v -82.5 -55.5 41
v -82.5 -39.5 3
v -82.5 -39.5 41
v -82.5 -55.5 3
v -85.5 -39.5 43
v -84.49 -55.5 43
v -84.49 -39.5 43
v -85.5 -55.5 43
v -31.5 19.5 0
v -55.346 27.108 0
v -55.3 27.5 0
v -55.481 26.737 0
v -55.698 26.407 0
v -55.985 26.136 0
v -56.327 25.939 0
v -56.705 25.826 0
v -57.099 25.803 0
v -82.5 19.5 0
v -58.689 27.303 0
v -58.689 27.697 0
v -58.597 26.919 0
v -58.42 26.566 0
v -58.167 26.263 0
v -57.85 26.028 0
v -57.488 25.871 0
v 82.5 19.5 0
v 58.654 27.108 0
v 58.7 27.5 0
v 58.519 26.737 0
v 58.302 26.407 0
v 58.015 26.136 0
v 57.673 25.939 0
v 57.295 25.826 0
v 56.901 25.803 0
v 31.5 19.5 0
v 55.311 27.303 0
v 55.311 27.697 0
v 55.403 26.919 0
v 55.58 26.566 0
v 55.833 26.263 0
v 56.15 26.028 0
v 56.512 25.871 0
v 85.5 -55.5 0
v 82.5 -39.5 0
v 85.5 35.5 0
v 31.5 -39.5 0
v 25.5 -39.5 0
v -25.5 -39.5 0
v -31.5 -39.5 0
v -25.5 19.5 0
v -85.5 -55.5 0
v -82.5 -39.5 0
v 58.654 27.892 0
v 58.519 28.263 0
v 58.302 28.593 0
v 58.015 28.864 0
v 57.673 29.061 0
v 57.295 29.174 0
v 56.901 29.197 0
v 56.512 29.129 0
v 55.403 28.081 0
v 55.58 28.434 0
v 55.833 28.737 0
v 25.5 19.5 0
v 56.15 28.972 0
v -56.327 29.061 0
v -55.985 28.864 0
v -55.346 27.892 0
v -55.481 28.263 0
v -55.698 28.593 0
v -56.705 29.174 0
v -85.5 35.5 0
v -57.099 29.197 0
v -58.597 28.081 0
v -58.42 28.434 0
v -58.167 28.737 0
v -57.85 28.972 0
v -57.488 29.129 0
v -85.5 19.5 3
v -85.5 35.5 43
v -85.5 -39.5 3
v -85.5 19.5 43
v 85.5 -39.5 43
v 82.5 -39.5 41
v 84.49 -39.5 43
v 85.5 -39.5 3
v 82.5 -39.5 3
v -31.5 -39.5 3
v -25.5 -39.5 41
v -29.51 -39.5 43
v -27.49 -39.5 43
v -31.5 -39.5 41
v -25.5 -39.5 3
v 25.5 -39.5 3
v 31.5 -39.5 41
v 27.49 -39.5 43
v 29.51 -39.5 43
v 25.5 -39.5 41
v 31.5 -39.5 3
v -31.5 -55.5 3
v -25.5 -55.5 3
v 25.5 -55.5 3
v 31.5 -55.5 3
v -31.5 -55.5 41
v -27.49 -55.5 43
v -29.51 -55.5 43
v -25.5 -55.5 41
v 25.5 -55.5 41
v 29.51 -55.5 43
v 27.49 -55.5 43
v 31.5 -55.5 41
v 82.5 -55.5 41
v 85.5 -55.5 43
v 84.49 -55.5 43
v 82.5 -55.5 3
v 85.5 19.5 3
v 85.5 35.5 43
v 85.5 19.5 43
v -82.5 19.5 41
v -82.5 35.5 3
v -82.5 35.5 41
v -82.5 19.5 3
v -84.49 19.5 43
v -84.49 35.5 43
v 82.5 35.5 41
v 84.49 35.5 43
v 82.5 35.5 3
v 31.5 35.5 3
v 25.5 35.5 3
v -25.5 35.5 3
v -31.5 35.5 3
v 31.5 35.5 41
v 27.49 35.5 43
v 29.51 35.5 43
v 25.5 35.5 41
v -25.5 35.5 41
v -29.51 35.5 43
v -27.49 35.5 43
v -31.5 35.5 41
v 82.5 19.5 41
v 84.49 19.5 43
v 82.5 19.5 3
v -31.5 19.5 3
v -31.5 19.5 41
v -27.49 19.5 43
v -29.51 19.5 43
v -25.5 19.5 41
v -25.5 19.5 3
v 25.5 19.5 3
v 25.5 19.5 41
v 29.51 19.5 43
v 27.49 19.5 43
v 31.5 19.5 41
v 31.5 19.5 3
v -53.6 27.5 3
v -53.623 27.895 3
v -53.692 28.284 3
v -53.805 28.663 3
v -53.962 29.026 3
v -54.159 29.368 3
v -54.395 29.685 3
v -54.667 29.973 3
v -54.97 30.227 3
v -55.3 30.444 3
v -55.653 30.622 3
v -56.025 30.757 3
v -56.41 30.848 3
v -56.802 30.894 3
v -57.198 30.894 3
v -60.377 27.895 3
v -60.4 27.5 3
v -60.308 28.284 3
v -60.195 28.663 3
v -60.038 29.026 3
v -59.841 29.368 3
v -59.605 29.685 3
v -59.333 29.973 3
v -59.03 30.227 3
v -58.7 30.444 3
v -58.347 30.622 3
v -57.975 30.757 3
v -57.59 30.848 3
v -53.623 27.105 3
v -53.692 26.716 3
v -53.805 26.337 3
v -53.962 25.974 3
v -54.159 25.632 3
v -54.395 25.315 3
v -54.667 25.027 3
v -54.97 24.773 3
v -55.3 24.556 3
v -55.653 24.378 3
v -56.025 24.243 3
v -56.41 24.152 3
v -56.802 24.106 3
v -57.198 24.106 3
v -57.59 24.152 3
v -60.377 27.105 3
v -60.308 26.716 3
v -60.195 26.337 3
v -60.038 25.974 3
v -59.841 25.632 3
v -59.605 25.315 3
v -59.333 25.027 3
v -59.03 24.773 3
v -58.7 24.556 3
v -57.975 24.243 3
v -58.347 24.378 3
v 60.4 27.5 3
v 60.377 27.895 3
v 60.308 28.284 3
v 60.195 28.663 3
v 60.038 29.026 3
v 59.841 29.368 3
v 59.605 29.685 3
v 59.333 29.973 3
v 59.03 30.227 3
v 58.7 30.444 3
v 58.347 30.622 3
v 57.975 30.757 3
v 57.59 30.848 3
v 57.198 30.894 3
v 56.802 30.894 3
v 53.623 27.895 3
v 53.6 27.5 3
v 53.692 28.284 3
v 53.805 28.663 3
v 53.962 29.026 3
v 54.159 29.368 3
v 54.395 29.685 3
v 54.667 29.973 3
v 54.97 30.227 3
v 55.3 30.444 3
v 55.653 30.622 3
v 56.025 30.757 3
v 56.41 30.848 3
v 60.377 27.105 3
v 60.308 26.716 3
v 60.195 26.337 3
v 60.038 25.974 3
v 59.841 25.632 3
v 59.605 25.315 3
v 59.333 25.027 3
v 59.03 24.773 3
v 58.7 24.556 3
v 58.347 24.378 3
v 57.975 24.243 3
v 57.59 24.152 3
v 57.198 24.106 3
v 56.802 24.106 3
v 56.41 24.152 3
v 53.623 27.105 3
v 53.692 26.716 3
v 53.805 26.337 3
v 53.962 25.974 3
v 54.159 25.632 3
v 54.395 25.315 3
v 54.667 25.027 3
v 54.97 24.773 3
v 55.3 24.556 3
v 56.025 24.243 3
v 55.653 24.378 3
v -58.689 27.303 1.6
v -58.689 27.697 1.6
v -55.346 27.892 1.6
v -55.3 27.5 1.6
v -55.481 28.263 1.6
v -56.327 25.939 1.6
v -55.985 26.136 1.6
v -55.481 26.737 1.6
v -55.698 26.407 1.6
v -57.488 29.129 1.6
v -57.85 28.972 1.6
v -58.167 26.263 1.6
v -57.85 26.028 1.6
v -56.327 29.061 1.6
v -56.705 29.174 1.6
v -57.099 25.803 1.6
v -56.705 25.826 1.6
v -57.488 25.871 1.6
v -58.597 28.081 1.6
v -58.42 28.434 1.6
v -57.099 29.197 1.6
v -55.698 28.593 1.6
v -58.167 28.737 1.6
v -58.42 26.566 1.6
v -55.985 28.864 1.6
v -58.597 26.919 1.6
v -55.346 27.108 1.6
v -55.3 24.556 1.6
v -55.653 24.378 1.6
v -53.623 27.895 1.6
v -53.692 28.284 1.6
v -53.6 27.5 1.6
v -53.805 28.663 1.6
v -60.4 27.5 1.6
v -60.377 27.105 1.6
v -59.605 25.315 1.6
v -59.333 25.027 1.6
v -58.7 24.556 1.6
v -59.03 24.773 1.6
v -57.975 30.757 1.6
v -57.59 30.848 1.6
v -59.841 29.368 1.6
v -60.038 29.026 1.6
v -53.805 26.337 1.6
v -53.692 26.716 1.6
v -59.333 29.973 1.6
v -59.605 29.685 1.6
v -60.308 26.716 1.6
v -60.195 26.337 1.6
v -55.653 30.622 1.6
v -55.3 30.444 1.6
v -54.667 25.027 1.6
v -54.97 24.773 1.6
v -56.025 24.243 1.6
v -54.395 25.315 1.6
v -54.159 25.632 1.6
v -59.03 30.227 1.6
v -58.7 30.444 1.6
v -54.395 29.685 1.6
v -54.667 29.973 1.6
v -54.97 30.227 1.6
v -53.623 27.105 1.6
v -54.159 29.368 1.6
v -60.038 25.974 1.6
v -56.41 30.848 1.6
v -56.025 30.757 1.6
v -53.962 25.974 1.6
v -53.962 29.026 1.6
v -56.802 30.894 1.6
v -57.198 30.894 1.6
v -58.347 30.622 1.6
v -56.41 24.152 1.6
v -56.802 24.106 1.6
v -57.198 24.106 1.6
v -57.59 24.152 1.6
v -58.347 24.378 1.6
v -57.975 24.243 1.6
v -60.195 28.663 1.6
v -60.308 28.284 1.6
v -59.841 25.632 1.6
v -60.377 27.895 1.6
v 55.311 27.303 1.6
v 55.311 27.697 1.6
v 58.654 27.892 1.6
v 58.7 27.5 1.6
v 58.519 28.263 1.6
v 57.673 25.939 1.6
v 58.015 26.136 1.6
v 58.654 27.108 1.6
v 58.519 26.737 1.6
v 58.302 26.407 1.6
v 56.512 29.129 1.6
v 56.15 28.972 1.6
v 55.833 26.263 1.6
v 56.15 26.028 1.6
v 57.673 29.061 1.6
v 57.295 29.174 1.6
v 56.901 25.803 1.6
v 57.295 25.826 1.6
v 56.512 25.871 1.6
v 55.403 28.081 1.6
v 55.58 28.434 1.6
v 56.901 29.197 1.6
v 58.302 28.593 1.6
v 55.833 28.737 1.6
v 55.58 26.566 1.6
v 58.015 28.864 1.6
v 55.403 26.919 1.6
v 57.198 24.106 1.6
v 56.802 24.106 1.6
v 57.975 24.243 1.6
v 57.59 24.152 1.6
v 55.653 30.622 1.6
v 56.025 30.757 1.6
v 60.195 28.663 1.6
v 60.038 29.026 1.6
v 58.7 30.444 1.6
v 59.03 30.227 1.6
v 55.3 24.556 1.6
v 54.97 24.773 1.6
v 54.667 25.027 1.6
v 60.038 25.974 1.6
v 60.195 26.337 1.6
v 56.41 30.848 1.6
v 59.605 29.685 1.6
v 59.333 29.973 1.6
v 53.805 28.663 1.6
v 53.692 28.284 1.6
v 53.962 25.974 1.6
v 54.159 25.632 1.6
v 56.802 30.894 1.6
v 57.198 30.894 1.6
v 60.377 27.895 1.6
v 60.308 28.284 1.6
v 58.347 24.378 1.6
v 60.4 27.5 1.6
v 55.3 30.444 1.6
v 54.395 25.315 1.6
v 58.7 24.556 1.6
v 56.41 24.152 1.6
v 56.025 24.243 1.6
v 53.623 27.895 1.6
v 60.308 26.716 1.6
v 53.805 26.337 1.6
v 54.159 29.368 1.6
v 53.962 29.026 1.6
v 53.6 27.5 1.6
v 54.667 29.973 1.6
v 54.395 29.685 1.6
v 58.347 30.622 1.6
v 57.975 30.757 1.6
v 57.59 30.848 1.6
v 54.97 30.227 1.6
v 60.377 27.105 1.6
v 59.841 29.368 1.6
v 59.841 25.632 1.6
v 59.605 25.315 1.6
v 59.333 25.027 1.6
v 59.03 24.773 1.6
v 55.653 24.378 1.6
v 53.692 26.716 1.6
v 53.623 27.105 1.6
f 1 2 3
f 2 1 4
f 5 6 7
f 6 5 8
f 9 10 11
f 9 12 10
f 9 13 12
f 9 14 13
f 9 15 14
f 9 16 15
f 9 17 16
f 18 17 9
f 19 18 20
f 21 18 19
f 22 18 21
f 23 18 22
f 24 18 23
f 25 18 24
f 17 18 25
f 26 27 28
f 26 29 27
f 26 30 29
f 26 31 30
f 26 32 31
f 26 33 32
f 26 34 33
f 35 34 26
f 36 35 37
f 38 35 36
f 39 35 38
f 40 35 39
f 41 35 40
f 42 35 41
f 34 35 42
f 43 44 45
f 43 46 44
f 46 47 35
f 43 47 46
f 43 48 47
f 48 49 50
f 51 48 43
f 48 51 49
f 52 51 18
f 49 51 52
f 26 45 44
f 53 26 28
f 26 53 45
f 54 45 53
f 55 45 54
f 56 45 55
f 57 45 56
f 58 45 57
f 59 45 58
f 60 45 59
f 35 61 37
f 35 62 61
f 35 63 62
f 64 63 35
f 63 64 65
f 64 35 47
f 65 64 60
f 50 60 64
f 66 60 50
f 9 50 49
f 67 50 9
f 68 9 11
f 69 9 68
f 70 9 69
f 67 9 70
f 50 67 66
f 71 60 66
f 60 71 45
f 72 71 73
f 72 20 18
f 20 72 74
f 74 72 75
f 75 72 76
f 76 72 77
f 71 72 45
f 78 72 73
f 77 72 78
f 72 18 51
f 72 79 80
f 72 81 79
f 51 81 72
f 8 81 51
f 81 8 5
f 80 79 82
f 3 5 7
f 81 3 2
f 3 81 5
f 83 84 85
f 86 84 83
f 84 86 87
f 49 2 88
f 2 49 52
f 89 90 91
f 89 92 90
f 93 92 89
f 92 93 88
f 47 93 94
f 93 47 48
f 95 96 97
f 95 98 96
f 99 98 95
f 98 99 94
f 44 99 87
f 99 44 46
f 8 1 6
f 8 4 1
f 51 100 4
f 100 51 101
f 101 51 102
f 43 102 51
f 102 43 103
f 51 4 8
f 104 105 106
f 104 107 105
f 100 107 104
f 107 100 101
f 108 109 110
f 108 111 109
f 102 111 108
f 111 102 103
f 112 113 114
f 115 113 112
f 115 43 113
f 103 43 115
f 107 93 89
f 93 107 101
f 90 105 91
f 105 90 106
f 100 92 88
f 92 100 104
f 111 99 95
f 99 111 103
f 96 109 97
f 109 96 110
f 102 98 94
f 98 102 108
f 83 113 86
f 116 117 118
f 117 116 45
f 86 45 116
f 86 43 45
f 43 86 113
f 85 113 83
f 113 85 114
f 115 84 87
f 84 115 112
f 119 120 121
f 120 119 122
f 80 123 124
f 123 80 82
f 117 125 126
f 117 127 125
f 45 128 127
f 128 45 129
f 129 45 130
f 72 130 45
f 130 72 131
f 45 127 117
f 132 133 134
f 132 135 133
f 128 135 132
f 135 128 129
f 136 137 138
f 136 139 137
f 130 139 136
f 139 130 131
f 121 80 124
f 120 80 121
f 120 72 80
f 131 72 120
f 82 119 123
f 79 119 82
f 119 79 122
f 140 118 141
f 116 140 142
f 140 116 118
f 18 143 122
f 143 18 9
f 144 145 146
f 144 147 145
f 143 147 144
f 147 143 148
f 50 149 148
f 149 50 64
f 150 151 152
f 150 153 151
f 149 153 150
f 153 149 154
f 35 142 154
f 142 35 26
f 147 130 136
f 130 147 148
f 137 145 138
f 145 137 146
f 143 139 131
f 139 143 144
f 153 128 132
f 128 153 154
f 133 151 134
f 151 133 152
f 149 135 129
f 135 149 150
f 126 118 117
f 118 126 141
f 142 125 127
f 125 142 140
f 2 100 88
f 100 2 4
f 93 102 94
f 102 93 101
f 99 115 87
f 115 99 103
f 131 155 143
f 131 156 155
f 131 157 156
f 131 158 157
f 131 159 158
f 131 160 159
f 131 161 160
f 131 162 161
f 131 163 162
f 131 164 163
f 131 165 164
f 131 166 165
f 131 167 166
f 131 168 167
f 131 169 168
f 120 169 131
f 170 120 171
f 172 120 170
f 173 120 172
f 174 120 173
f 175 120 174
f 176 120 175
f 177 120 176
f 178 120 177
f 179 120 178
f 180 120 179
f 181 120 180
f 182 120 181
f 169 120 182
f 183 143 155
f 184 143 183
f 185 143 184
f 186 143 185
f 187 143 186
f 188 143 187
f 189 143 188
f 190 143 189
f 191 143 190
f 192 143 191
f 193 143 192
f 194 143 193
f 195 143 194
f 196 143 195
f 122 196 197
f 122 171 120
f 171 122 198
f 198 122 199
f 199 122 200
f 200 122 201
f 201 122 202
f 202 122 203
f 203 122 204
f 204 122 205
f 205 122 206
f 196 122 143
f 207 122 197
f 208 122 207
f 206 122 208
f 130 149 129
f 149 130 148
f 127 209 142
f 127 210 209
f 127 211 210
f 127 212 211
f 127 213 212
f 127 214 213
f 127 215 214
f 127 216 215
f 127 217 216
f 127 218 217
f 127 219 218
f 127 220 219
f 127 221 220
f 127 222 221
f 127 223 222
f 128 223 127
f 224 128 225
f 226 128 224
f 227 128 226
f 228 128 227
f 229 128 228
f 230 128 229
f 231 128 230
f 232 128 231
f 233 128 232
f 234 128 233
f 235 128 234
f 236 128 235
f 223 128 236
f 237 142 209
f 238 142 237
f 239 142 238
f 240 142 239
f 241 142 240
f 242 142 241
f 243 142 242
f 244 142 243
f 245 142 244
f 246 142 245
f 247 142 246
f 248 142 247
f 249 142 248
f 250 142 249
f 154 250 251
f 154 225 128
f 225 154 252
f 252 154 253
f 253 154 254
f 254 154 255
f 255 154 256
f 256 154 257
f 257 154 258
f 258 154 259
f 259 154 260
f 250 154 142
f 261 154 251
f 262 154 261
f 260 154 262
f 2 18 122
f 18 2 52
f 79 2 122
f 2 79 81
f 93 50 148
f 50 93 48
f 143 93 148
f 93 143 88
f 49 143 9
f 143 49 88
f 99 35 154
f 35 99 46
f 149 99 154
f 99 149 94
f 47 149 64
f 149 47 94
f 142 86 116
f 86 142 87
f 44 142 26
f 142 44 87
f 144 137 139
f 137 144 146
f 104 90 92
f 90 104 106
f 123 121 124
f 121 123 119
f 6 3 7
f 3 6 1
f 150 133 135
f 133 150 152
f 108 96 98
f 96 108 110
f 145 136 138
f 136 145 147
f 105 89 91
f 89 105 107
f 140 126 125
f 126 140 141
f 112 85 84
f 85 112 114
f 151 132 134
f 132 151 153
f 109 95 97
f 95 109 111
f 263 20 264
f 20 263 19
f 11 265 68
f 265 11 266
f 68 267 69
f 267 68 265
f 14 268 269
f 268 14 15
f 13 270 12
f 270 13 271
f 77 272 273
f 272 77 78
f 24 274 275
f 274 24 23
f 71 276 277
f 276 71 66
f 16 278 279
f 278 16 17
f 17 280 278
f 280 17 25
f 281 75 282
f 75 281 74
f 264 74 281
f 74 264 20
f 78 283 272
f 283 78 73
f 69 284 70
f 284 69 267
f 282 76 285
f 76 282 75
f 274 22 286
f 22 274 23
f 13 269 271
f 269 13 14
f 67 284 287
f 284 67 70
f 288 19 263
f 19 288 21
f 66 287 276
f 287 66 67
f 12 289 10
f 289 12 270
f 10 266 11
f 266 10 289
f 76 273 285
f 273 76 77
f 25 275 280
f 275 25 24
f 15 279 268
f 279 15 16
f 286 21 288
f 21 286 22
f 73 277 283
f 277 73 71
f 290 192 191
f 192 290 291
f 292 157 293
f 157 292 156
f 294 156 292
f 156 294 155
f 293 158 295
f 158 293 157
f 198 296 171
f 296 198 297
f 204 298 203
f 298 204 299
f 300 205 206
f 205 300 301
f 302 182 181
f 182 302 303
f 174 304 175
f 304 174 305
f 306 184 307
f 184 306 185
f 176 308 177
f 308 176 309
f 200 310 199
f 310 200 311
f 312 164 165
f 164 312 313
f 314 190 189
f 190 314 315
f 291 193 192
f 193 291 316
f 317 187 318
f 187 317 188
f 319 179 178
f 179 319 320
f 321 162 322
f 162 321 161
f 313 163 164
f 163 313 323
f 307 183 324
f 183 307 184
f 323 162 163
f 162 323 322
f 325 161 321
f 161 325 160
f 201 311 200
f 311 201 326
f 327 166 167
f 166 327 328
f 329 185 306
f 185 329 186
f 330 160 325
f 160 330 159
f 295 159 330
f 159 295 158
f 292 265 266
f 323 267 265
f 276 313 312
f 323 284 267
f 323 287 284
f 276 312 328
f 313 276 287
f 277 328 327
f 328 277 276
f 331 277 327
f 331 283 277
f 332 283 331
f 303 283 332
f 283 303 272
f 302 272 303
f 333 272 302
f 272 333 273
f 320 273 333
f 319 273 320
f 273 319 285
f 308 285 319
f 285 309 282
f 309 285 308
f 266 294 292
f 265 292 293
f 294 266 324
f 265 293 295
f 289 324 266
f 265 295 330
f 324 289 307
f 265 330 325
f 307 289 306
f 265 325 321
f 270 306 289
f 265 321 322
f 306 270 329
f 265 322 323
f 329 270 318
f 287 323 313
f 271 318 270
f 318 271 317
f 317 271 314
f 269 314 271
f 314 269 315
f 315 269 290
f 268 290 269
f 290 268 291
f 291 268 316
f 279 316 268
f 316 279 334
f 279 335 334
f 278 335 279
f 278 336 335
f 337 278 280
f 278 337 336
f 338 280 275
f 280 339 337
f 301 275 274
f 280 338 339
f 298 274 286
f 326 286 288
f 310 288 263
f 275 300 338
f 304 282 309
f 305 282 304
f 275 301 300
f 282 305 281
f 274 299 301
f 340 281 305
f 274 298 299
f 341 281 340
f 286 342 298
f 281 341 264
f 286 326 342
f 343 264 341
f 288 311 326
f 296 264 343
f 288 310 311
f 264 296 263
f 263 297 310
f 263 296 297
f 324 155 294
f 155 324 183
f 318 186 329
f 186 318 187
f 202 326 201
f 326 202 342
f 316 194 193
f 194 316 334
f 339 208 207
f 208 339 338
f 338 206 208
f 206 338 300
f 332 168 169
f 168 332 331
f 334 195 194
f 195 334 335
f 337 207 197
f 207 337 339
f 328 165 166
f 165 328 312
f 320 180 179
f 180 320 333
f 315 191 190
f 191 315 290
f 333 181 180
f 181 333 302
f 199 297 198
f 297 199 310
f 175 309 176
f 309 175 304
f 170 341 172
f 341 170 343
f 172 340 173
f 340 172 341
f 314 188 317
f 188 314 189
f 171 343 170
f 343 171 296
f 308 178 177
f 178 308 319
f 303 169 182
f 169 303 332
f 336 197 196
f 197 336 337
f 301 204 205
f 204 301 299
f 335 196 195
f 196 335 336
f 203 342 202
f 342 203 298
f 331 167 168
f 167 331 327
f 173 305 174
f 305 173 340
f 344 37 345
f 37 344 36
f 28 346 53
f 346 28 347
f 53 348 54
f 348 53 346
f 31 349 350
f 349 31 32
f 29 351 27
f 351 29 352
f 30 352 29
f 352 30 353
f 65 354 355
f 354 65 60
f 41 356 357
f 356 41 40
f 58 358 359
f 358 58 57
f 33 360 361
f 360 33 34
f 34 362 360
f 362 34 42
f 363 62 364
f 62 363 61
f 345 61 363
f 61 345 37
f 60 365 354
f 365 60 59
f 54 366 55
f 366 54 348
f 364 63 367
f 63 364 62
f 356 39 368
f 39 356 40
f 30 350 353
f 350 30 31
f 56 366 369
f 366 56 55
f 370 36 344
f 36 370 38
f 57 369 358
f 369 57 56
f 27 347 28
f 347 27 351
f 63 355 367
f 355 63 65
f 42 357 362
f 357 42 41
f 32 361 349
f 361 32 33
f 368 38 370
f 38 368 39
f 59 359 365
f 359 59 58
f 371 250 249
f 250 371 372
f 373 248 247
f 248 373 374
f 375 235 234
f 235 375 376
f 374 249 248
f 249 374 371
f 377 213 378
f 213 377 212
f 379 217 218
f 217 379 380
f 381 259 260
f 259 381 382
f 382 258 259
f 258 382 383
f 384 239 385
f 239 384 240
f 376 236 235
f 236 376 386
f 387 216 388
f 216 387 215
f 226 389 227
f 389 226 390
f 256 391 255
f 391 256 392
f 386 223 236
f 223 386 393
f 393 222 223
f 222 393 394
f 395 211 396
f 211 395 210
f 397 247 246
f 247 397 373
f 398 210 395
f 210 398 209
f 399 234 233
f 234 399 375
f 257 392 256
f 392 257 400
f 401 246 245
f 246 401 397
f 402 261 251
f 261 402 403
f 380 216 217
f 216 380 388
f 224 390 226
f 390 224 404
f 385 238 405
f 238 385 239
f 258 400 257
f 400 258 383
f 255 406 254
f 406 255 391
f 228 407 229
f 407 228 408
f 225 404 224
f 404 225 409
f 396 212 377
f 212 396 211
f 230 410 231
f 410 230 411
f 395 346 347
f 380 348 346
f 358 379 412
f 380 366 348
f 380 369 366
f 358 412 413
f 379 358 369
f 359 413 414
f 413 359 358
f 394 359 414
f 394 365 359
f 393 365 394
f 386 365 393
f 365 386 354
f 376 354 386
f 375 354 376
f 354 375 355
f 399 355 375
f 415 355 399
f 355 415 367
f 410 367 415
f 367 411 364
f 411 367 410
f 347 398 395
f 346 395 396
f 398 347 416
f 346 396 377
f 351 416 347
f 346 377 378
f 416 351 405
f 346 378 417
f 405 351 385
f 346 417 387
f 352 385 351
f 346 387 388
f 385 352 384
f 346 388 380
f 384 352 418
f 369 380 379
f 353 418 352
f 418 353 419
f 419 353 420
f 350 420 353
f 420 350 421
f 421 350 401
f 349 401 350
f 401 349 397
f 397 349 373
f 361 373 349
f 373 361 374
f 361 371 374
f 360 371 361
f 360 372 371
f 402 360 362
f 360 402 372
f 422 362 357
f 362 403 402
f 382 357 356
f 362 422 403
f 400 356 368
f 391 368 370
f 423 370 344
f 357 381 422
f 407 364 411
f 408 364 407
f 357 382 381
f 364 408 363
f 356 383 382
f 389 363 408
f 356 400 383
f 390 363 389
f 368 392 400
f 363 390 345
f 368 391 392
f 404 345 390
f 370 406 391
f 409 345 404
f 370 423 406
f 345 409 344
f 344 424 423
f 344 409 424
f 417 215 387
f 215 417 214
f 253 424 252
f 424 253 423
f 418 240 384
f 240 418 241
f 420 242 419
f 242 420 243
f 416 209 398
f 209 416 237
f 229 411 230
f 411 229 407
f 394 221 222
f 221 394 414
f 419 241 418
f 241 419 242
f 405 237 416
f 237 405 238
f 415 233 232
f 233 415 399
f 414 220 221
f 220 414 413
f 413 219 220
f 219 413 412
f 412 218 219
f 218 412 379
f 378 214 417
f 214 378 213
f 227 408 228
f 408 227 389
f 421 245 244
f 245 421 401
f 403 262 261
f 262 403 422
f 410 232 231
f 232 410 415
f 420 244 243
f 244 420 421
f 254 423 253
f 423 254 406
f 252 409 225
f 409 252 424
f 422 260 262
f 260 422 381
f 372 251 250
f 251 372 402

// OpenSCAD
/* =====================================================
   UniFi Toolless Mini Rack Shelf — device docks
   =====================================================
   Organizers that sit on Ubiquiti's fixed Toolless Mini
   Rack Shelf (UACC-Rack-Shelf-TL). The steel shelf carries
   the load (rated 20 kg). These parts only keep things in
   place:

     dock    a ladder frame with slotted fins that holds
             devices standing on edge (Mac minis, a
             NucBox, power bricks)
     corner  L guides (left and right) that locate the
             front corners of a device lying flat (A9 Mega,
             MS-A2)
     pins    loose locating pins. Each drops through a
             counterbored hole in a part and into the
             shelf's perforations so the part can't slide.

   Shelf perforations (measured): Ø3.5 holes in a 60°
   staggered grid, 6.0 mm apart along a row (left–right),
   rows 5.2 mm apart. All of a part's pin holes sit on one
   row, a multiple of 6 mm apart, so they always line up
   with the holes and a slightly off row spacing doesn't
   add up.

   The perforated field is the middle ~382 × 318 mm of the
   shelf (about 74 mm in from the front and back edges).
   The pins have to land inside it.

   Coordinates: X across, Y back from the front of the
   device, Z up from the shelf top.
   ===================================================== */

$fa = 2;
$fs = 0.4;

/* ── Selection (set by presets) ─────────────────────── */
part = "dock";      // [dock, corner_left, corner_right, pins, fit_test, none]

/* ── Dock ───────────────────────────────────────────── */
slots     = 3;      // devices side by side
slot_w    = 51;     // device thickness + clearance
dev_d     = 127;    // device depth (front to back)
div_t     = 6;      // divider between devices (= air gap between them)
fin_h     = 40;     // fin height above the floor
fin_len   = 16;     // fin length along the device
fin_front = 8;      // front fins start this far behind the device front
back_keep = 28;     // back fins stop this far short of the device back
                    // (Mac mini M4: keeps the power button reachable)

/* ── Corner guide ───────────────────────────────────── */
corner_arm = 40;
corner_h   = 12;    // wall height above the shelf
flange_w   = 12;    // outward base flange carrying the pin holes

/* ── Shared ─────────────────────────────────────────── */
base_t   = 3;       // floor bars, rails and flanges
wall_t   = 3;       // outer walls
lead     = 2;       // lead-in chamfer at the top of each slot

/* ── Shelf + pins ───────────────────────────────────── */
hole_pitch = 6.0;   // along a perforation row
row_pitch  = 5.2;   // between rows (60° stagger)
pin_d      = 3.1;   // into Ø3.5 shelf holes
pin_hole   = 3.4;   // through the part
pin_head_d = 6.2;
pin_head_t = 1.2;
cbore_d    = 6.8;
cbore_t    = 1.4;
peg_len    = 2.0;   // how far a pin pokes below the part
pin_count  = 24;    // pins per plate

/* ── Derived ────────────────────────────────────────── */
// Scenes `include` this file and set these per dock.
$slots     = slots;
$slot_w    = slot_w;
$dev_d     = dev_d;
$div_t     = div_t;
$fin_h     = fin_h;
$back_keep = back_keep;

eps = 0.01;
function dock_w()    = 2 * wall_t + $slots * $slot_w + ($slots - 1) * $div_t;
function bar_front() = [fin_front, fin_front + fin_len];
function bar_back()  = [$dev_d - $back_keep - fin_len, $dev_d - $back_keep];

// x of slot i's left edge, with the dock's left outer face at x = 0
function slot_x(i) = wall_t + i * ($slot_w + $div_t);
function slot_c(i) = slot_x(i) + $slot_w / 2;

// Pin holes: in the outer slots' floors, on the back bar (the front
// bar is often outside the perforated field), snapped so they're a
// whole number of hole pitches apart.
function dock_pin_xs() =
    let(a = $slots == 1 ? slot_c(0) - 2 * hole_pitch : slot_c(0),
        b = $slots == 1 ? slot_c(0) + 2 * hole_pitch : slot_c($slots - 1))
    [a, a + hole_pitch * round((b - a) / hole_pitch)];
function dock_pin_y() = (bar_back()[0] + bar_back()[1]) / 2;

/* ── Pin hole (counterbored from the top) ───────────── */
module pin_hole_at(x, y) {
    translate([x, y, -1]) cylinder(d = pin_hole, h = base_t + 2);
    translate([x, y, base_t - cbore_t]) cylinder(d = cbore_d, h = cbore_t + 1);
}

/* ── Dock ───────────────────────────────────────────── */

module dock() {
    w_all = dock_w();
    walls = concat(
        [[0, wall_t]],
        [for (i = [0 : $slots - 2]) [slot_x(i) + $slot_w, $div_t]],
        [[w_all - wall_t, wall_t]]);
    difference() {
        union() {
            for (bar = [bar_front(), bar_back()]) {
                // floor bar the devices stand on
                translate([0, bar[0], 0]) cube([w_all, fin_len, base_t]);
                // fins
                for (w = walls)
                    translate([w[0], bar[0], 0]) cube([w[1], fin_len, base_t + $fin_h]);
            }
            // rails tie the two bars together under every wall
            for (w = walls)
                translate([w[0], bar_front()[0], 0])
                    cube([w[1], bar_back()[1] - bar_front()[0], base_t]);
        }
        // lead-in at the top of every slot
        for (i = [0 : $slots - 1])
            translate([slot_x(i), -1, base_t + $fin_h])
                rotate([-90, 0, 0]) linear_extrude($dev_d + 2)
                    polygon([[-lead, -eps], [$slot_w + lead, -eps], [$slot_w, lead], [0, lead]]);
        for (x = dock_pin_xs()) pin_hole_at(x, dock_pin_y());
    }
}

/* ── Corner guide ───────────────────────────────────── */
// Locates a front corner of a device lying flat. Device corner at
// the origin, device in +X/+Y (a left-front corner; mirror it for
// the right). The pin flange sticks out in front, where there's room
// between the rows, so the side wall adds only wall_t + clearance
// and two machines can sit close together.

corner_pin_at = [12, 12 + 2 * hole_pitch];   // along the front arm

module corner() {
    difference() {
        union() {
            // walls
            translate([-wall_t, -wall_t, 0]) cube([corner_arm + wall_t, wall_t, base_t + corner_h]);
            translate([-wall_t, -wall_t, 0]) cube([wall_t, corner_arm + wall_t, base_t + corner_h]);
            // front flange
            translate([-wall_t, -wall_t - flange_w, 0]) cube([corner_arm + wall_t, flange_w + eps, base_t]);
        }
        for (p = corner_pin_at) pin_hole_at(p, -wall_t - flange_w / 2);
    }
}

/* ── Pin ────────────────────────────────────────────── */
// Head down on the bed. Head sits in the counterbore, and the shaft
// goes through the part and into a shelf hole.

module pin() {
    shaft = base_t - cbore_t + peg_len;
    cylinder(d = pin_head_d, h = pin_head_t);
    translate([0, 0, pin_head_t - eps]) {
        cylinder(d = pin_d, h = shaft - 0.5 + eps);
        translate([0, 0, shaft - 0.5]) cylinder(d1 = pin_d, d2 = pin_d - 1, h = 0.5);
    }
}

module pins_plate() {
    cols = 6;
    for (i = [0 : pin_count - 1])
        translate([(i % cols) * 9, floor(i / cols) * 9, 0]) pin();
}

/* ── Fit test ───────────────────────────────────────── */
// A bar with two pin holes 5 pitches apart, plus two pins.
// Drop it on the shelf: both pins should fall into holes.

module fit_test() {
    span = 5 * hole_pitch;
    difference() {
        translate([-8, -7, 0]) cube([span + 16, 14, base_t]);
        pin_hole_at(0, 0);
        pin_hole_at(span, 0);
    }
    for (i = [0, 1]) translate([span / 2 + (i - 0.5) * 10, 16, 0]) pin();
}

/* ── Print layouts ──────────────────────────────────── */

if (part == "dock") {
    translate([-dock_w() / 2, -dev_d / 2, 0]) dock();
} else if (part == "corner_left") {
    corner();
} else if (part == "corner_right") {
    mirror([1, 0, 0]) corner();
} else if (part == "pins") {
    pins_plate();
} else if (part == "fit_test") {
    fit_test();
}
